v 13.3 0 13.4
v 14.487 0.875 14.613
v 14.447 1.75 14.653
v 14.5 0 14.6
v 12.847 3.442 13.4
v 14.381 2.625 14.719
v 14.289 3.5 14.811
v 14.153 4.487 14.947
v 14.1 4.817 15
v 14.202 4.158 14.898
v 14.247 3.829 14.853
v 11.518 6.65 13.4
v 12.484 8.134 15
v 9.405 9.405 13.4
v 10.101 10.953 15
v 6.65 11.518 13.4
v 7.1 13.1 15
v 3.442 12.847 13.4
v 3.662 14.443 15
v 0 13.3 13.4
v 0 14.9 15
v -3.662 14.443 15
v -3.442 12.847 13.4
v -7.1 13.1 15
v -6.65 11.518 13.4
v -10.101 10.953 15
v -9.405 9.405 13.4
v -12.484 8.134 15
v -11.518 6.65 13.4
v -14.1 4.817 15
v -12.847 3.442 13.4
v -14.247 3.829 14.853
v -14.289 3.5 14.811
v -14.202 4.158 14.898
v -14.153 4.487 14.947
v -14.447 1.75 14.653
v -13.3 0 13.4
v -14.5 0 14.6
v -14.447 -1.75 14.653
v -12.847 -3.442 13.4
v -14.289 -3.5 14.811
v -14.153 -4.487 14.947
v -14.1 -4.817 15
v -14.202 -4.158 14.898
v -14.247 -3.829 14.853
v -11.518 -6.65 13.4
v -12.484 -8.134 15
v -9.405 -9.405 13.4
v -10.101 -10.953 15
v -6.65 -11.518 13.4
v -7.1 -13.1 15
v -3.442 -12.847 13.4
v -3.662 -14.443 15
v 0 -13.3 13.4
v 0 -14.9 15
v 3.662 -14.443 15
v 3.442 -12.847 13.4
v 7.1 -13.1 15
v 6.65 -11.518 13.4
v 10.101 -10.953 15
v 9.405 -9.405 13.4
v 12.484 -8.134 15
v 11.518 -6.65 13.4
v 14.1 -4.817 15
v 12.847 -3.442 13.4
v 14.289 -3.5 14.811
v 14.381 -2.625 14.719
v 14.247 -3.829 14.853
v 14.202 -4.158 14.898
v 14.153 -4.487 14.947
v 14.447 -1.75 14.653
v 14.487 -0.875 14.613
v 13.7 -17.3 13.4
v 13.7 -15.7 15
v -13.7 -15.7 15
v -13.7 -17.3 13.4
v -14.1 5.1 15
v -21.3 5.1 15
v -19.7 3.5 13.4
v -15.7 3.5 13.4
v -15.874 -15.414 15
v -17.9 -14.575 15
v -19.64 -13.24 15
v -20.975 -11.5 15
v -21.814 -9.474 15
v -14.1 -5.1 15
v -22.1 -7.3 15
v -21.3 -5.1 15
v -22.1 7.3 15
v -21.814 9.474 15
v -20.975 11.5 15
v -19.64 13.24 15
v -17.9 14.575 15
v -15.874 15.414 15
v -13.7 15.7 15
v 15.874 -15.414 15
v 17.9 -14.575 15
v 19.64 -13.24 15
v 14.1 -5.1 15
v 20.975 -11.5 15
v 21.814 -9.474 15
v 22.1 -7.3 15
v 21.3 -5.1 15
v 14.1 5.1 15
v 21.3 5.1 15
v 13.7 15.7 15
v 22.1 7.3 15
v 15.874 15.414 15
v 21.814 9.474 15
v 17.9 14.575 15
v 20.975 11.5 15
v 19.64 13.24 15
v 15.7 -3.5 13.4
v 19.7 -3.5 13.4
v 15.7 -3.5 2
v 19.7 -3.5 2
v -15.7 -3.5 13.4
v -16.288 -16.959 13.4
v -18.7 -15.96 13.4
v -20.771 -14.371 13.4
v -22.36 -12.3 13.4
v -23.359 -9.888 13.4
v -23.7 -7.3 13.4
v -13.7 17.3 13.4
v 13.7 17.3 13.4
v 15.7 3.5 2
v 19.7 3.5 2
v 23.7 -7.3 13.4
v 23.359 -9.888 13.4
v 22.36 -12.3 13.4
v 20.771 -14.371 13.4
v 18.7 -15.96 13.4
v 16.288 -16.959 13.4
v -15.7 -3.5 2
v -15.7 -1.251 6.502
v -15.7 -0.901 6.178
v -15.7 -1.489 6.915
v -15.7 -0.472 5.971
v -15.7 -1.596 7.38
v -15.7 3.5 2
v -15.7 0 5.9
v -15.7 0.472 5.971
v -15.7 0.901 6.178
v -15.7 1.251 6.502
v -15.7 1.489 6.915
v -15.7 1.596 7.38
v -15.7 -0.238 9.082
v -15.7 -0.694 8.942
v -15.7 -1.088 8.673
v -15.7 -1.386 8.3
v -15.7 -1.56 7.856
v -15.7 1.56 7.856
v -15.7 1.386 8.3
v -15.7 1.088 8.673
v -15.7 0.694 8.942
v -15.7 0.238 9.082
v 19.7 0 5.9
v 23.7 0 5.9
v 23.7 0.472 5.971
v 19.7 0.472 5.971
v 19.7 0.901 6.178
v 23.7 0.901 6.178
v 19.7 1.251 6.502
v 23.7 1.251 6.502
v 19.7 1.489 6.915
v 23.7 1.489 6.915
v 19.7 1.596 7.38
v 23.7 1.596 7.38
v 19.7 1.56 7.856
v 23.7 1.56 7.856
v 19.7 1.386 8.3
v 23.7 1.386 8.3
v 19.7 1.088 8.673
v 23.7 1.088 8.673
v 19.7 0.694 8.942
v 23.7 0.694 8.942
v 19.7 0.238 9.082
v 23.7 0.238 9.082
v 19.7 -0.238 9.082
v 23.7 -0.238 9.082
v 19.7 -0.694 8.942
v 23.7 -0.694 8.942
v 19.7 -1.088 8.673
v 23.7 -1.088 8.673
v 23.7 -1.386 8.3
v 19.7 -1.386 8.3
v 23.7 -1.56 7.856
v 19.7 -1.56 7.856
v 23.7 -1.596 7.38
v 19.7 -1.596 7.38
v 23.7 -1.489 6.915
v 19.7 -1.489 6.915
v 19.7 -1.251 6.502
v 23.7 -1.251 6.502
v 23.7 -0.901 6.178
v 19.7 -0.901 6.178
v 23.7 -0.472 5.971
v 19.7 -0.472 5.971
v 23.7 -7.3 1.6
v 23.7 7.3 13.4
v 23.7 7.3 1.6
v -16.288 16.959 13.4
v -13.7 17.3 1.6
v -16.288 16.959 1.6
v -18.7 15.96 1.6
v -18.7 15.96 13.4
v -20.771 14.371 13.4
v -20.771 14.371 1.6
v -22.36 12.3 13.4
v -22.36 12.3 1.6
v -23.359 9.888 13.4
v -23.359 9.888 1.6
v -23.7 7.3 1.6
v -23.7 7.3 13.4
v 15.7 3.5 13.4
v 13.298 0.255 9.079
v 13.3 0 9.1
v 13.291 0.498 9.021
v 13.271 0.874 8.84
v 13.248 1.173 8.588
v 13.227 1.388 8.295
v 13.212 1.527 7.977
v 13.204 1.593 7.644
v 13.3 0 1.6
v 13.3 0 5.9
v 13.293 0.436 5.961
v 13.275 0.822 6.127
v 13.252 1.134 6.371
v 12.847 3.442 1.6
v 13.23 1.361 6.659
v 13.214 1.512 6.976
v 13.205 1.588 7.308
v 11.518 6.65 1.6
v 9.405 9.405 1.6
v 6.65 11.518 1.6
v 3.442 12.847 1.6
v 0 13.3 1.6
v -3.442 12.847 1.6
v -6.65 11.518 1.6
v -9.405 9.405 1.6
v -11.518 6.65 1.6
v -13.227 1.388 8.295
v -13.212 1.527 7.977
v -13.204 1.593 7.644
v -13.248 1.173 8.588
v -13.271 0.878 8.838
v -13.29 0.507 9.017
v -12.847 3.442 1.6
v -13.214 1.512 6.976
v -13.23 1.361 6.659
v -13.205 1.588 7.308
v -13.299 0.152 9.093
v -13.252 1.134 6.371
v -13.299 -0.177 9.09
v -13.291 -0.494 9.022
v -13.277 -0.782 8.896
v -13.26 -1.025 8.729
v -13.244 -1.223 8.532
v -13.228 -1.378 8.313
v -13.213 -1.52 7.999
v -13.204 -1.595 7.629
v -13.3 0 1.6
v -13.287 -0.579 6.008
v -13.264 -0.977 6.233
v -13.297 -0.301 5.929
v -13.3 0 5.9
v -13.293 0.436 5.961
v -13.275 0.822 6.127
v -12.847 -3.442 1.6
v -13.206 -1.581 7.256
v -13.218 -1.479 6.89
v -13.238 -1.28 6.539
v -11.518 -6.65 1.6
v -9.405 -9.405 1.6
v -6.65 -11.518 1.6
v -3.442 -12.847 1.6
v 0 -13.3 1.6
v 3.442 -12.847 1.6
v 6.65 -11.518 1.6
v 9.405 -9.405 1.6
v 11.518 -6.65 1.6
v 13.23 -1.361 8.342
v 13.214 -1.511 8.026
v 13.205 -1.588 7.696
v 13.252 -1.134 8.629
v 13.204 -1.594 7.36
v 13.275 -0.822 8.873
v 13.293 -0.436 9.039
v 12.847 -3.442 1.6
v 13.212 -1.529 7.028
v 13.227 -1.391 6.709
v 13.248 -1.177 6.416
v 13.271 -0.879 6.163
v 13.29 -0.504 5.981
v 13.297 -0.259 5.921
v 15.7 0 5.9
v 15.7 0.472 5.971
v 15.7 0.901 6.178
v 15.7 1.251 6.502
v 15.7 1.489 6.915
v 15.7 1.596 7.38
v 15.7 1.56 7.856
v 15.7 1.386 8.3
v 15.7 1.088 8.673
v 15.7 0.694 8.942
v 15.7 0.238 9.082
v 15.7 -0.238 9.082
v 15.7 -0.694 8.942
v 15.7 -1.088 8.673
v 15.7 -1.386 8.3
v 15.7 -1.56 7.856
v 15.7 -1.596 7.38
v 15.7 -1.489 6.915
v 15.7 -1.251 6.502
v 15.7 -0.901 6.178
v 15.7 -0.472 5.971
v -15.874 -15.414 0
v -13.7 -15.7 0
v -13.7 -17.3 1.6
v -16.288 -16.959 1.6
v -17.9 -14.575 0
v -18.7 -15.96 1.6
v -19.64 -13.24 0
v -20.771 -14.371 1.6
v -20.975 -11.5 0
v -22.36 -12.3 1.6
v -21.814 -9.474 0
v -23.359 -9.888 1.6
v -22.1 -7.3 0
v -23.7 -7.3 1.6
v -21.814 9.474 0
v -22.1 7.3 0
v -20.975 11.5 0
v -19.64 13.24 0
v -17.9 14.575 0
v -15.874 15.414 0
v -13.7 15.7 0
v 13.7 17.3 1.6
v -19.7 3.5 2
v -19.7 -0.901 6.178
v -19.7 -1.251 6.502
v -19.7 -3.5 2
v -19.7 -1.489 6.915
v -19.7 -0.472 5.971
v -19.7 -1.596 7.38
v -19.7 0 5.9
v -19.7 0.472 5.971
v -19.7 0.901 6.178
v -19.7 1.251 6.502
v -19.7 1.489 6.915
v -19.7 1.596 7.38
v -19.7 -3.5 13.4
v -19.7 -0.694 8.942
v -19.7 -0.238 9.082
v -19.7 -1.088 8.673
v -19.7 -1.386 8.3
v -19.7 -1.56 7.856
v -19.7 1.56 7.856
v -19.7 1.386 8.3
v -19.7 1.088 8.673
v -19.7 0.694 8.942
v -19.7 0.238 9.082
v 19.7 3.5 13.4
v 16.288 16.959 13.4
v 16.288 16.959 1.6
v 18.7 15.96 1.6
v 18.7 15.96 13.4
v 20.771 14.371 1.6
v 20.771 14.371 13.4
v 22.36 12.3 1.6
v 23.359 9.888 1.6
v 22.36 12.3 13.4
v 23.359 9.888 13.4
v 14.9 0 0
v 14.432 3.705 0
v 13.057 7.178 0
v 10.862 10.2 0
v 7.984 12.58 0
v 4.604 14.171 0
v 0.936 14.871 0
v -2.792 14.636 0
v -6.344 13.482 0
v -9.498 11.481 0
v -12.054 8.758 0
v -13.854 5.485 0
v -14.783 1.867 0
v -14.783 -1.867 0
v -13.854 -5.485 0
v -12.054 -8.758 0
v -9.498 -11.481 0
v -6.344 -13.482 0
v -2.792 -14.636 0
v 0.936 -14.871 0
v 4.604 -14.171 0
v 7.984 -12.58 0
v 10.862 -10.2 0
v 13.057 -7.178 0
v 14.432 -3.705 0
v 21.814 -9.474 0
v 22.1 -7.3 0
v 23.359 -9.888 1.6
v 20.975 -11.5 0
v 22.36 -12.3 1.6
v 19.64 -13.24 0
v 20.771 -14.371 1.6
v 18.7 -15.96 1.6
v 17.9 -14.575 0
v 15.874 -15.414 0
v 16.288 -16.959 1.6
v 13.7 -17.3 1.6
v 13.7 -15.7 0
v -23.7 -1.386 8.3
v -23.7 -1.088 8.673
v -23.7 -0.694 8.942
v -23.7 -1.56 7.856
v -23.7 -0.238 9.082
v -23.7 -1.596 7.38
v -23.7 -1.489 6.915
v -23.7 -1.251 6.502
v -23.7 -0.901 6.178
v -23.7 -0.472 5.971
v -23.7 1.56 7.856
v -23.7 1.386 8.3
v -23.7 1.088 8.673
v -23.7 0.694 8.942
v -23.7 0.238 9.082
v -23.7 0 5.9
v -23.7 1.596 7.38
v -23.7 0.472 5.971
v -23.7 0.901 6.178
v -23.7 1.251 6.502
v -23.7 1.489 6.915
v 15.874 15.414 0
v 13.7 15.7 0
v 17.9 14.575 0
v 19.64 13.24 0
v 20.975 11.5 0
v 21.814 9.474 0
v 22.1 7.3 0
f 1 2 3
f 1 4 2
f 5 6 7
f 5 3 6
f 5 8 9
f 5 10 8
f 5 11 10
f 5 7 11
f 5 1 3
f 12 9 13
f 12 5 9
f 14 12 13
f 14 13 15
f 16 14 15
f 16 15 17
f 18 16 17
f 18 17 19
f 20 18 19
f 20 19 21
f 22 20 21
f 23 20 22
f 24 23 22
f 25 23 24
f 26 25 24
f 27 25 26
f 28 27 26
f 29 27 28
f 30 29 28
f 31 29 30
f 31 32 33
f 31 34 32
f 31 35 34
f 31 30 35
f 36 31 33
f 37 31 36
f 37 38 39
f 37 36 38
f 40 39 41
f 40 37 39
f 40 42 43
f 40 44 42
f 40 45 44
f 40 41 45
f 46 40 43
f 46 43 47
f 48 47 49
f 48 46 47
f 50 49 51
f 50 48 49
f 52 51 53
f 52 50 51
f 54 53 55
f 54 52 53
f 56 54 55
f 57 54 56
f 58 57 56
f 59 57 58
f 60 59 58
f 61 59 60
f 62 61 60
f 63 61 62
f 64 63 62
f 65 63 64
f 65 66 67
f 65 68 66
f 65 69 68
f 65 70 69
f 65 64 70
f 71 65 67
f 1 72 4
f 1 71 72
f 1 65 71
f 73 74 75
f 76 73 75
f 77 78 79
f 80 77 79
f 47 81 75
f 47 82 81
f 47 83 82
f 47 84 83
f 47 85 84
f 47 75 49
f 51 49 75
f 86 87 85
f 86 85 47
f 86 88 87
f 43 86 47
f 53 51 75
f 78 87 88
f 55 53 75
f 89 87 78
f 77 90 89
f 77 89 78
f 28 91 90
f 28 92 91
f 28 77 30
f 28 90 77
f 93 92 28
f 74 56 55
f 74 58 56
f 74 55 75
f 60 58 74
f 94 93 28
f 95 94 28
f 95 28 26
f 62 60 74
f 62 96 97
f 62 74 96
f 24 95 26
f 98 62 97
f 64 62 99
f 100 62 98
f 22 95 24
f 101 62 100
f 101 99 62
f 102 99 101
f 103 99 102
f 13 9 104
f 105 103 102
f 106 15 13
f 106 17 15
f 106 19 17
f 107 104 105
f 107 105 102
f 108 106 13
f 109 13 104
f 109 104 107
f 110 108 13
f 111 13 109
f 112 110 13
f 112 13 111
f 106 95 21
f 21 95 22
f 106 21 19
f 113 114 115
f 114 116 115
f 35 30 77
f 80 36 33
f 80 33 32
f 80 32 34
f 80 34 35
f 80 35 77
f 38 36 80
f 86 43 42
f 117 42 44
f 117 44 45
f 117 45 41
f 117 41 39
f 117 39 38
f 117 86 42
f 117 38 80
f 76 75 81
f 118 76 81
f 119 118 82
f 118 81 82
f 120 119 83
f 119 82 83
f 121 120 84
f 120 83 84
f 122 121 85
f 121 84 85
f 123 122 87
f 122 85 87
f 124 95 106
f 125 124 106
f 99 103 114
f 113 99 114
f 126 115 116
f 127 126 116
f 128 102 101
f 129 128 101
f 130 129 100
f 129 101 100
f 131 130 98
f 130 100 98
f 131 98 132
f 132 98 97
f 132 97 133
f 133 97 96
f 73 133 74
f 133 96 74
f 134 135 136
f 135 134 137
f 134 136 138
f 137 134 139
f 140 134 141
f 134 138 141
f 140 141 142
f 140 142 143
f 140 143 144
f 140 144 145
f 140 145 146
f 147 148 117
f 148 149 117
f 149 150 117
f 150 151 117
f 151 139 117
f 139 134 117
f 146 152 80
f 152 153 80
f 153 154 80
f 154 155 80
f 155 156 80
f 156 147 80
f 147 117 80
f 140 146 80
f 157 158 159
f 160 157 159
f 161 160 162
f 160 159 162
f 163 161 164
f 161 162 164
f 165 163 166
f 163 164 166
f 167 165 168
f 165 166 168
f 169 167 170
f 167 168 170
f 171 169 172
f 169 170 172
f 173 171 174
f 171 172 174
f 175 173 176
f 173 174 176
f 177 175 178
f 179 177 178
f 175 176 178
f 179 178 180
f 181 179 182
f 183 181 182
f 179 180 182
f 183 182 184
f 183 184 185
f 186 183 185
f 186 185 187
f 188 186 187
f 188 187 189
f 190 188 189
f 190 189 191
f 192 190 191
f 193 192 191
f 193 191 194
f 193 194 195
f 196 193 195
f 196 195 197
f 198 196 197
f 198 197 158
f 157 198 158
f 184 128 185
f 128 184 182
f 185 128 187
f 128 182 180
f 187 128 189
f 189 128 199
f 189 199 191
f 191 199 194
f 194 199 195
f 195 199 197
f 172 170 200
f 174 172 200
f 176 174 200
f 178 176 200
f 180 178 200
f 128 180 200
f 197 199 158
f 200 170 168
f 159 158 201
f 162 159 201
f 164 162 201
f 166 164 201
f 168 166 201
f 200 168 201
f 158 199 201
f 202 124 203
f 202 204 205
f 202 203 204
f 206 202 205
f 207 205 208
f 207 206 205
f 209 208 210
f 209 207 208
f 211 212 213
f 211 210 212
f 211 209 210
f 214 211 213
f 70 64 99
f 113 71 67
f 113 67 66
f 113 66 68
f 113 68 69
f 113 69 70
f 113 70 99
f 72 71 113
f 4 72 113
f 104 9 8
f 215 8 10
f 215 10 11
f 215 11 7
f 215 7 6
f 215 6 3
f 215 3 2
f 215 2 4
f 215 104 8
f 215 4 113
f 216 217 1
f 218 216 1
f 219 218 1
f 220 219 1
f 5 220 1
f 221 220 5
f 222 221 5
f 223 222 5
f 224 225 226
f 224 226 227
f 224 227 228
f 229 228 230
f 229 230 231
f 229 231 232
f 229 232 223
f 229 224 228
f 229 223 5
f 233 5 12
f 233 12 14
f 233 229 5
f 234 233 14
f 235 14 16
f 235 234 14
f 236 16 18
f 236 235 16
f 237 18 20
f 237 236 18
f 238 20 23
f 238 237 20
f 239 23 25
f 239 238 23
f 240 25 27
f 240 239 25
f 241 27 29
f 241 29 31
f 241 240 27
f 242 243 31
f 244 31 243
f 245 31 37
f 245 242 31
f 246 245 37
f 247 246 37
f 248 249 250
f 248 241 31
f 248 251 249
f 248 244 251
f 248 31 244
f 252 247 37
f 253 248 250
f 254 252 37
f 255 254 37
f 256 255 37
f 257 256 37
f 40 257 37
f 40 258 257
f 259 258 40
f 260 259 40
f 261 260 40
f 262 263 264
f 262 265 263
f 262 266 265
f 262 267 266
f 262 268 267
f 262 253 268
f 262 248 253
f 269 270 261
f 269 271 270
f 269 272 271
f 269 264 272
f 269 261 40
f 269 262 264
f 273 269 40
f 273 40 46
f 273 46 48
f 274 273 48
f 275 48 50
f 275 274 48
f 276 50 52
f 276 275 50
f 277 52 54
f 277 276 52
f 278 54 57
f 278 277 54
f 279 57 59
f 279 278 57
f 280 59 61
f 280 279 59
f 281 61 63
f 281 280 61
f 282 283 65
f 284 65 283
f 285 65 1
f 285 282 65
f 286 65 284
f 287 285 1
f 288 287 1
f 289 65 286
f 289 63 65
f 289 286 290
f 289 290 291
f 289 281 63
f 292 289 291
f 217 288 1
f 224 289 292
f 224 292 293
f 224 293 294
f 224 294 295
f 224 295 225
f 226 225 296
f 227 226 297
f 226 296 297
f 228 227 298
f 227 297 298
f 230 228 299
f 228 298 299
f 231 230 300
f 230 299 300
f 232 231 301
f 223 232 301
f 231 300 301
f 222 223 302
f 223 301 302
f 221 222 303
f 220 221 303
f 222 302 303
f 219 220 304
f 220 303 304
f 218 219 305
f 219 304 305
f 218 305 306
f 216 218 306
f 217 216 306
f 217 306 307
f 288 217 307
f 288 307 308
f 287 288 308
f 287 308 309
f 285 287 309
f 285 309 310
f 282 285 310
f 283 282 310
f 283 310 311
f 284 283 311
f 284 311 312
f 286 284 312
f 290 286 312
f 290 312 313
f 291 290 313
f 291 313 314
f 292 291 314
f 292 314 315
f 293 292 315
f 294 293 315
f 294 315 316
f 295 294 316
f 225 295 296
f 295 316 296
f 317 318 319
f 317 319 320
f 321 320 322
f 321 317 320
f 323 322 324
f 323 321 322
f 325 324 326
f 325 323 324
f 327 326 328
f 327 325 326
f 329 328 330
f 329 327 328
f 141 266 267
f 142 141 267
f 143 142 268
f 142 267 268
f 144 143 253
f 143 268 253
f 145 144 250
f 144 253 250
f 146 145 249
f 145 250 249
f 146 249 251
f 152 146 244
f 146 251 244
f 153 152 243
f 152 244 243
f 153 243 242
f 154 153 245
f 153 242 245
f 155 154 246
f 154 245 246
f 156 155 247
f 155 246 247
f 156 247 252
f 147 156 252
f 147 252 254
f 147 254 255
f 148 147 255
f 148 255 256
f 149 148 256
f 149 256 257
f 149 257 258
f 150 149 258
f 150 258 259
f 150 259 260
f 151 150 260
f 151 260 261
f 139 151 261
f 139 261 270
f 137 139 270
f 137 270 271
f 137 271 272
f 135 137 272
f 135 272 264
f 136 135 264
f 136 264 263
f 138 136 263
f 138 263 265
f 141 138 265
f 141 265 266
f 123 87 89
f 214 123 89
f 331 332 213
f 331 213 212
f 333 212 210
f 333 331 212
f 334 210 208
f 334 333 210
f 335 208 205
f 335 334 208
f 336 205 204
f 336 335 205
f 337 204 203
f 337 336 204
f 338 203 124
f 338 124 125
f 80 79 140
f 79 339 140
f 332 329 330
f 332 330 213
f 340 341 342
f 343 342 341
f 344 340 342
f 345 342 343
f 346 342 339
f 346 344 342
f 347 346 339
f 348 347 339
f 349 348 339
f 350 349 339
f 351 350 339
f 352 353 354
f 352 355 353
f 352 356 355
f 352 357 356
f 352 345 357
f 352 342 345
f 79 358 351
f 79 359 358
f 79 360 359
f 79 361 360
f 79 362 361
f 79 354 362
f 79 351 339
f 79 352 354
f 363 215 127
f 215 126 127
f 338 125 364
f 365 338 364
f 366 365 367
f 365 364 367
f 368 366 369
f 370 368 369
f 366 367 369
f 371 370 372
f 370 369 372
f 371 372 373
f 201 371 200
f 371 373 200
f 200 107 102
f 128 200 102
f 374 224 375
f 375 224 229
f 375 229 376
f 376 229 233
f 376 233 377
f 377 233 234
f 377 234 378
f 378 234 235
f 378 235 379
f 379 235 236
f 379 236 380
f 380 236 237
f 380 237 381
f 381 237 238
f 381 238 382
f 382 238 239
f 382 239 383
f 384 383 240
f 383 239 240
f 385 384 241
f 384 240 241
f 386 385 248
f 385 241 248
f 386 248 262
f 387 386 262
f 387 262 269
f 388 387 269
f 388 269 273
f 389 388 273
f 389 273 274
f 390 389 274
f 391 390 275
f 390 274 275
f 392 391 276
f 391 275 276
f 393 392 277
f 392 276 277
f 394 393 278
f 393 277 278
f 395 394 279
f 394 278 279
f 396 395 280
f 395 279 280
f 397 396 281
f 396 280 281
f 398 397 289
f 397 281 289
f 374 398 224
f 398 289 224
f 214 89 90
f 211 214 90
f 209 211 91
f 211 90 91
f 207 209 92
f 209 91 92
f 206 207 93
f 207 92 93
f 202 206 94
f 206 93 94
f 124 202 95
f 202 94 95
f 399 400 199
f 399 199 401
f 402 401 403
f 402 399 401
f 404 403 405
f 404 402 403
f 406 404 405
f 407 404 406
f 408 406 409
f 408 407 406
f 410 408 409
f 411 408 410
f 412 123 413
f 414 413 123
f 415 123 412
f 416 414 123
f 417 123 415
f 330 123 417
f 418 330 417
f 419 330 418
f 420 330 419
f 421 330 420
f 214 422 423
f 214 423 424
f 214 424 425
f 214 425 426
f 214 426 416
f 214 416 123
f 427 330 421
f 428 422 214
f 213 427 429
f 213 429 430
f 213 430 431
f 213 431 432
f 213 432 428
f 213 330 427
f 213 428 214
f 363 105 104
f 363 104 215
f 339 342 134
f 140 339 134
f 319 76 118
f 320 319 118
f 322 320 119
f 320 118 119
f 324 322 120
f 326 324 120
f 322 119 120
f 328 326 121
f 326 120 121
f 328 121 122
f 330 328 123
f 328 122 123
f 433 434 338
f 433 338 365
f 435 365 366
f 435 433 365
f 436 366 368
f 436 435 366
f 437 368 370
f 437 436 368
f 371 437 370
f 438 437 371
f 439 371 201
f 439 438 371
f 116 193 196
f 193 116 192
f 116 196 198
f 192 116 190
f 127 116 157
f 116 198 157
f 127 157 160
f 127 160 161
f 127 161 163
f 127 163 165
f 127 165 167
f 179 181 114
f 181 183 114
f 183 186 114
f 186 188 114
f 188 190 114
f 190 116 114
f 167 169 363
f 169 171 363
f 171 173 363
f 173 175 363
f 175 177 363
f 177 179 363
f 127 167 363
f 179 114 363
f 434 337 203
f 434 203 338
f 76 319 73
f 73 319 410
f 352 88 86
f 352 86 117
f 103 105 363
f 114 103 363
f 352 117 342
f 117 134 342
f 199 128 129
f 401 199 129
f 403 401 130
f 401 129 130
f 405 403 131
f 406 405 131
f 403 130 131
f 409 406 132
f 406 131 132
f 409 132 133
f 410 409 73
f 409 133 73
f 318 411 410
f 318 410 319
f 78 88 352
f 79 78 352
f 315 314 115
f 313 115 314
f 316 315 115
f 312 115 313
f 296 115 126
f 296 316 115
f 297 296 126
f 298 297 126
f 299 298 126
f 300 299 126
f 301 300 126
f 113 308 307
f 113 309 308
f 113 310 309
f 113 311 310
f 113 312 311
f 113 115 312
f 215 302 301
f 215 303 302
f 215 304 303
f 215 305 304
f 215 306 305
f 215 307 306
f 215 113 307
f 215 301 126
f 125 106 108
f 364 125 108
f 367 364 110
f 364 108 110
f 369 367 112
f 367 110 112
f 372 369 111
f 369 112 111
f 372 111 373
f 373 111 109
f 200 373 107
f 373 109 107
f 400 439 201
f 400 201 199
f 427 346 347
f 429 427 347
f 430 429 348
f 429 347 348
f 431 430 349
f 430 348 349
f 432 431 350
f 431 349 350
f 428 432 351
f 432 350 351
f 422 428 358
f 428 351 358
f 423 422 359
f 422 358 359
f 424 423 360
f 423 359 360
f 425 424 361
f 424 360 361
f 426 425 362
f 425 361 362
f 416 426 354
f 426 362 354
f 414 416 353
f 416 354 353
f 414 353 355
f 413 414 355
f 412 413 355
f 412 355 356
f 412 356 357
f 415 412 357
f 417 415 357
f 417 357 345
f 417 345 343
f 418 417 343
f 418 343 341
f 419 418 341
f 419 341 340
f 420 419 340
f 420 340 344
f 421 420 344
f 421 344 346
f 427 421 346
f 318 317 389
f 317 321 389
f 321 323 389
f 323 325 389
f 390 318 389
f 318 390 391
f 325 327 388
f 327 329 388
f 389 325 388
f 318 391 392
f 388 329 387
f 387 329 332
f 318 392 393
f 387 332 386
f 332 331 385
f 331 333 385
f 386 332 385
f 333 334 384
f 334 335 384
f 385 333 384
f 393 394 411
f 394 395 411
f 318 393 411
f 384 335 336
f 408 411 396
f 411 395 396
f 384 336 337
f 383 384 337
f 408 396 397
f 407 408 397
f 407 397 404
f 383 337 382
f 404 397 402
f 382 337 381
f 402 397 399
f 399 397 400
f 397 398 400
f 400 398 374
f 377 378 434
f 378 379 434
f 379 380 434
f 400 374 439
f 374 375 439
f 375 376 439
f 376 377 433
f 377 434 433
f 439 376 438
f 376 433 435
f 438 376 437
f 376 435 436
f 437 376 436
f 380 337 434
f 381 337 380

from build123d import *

# Parameters (mm, degrees)
SKETCH1_W           = 47.4
SKETCH1_H           = 34.6
SKETCH1_R           = 13.3
BOSS_EXTRUDE1_DEPTH = 15
SKETCH2_R           = 1.6
CUT_EXTRUDE1_DEPTH  = 53.640763672
SKETCH3_W           = 4
SKETCH3_H           = 7
CUT_EXTRUDE2_DEPTH  = 13
CHAMFER1_SIZE       = 1.6
FILLET1_R           = 10
CHAMFER3_SIZE       = 1.6
CHAMFER4_SIZE       = 1.6


with BuildPart() as part:
    # Sketch1 → Boss-Extrude1 (new body)
    with BuildSketch(Plane.XY):
        Rectangle(SKETCH1_W, SKETCH1_H)
        Circle(SKETCH1_R, mode=Mode.SUBTRACT)
    extrude(amount=BOSS_EXTRUDE1_DEPTH)

    # Sketch2 → Cut-Extrude1 (cut, through all)
    with BuildSketch(Plane(origin=(23.7, 0, 0), x_dir=(0, 0, -1), z_dir=(1, 0, 0))):
        with Locations((-7.5, 0)):
            Circle(SKETCH2_R)
    extrude(amount=-CUT_EXTRUDE1_DEPTH, mode=Mode.SUBTRACT)

    # Sketch3 → Cut-Extrude2 (cut)
    with BuildSketch(Plane.XY.offset(15)):
        with Locations((17.7, 0)):
            Rectangle(SKETCH3_W, SKETCH3_H)
        with Locations((-17.7, 0)):
            Rectangle(SKETCH3_W, SKETCH3_H)
    extrude(amount=-CUT_EXTRUDE2_DEPTH, mode=Mode.SUBTRACT)

    # Chamfer1
    chamfer1_edges = [part.edges().sort_by_distance(p)[0] for p in [
        (-13.3, 0, 15),
    ]]
    chamfer(chamfer1_edges, length=CHAMFER1_SIZE)

    # Chamfer2
    # the kernel refuses this chamfer: 1.6 mm, written as the material it takes off along each edge
    with BuildSketch(Plane(origin=(19.7, -3.5, 15), x_dir=(0.9996219169112968, 0, 0.027495876610586226), z_dir=(0, 1, 0)), Plane(origin=(15.7, 3.5, 15), x_dir=(-0.9996219169112968, 0, 0.027495876610586285), z_dir=(0, -1, 0)), Plane(origin=(-15.7, -3.5, 15), x_dir=(0.9996219169112968, 0, 0.027495876610586285), z_dir=(0, 1, 0)), Plane(origin=(-19.7, 3.5, 15), x_dir=(-0.9996219169112968, 0, 0.027495876610586226), z_dir=(0, -1, 0))) as chamfer2_piece_1:
        with BuildLine():
            Line((1.645877112, 0), (-0.090475448, 1.64338847))
            Line((-0.090475448, 1.64338847), (-0.122463349, 1.642508602))
            ThreePointArc((-0.122463349, 1.642508602), (-0.054606763, 0.821436527), (-0.031987901, -0.000879868))
            Line((-0.031987901, -0.000879868), (0.000879868, -0.031987901))
            ThreePointArc((0.000879868, -0.031987901), (0.823196264, -0.009369039), (1.64675698, -0.031987901))
            Line((1.64675698, -0.031987901), (1.645877112, 0))
        make_face()
    extrude(amount=7, mode=Mode.SUBTRACT)
    with BuildSketch(Plane(origin=(19.7, 3.5, 15), x_dir=(0, 0.9996219169112968, 0.027495876610586285), z_dir=(-1, 0, 0)), Plane(origin=(15.7, -3.5, 15), x_dir=(0, -0.9996219169112968, 0.02749587661058628), z_dir=(1, 0, 0)), Plane(origin=(-15.7, 3.5, 15), x_dir=(2.330586862957201e-15, 0.9996219169112966, 0.027495876610586265), z_dir=(-1, 0, 0)), Plane(origin=(-19.7, -3.5, 15), x_dir=(2.3305868629572013e-15, -0.9996219169112968, 0.02749587661058628), z_dir=(1, 0, 0))) as chamfer2_piece_2:
        with BuildLine():
            Line((1.645877112, 0), (-0.090475448, 1.64338847))
            Line((-0.090475448, 1.64338847), (-0.122463349, 1.642508602))
            ThreePointArc((-0.122463349, 1.642508602), (-0.054606763, 0.821436527), (-0.031987901, -0.000879868))
            Line((-0.031987901, -0.000879868), (0.000879868, -0.031987901))
            ThreePointArc((0.000879868, -0.031987901), (0.823196264, -0.009369039), (1.64675698, -0.031987901))
            Line((1.64675698, -0.031987901), (1.645877112, 0))
        make_face()
    extrude(amount=4, mode=Mode.SUBTRACT)
    with BuildSketch(Plane(origin=(15.7, -3.5, 15), x_dir=(0, -0.9996219169112968, 0.02749587661058628), z_dir=(1, 0, 0))) as chamfer2_piece_3a_section:
        with BuildLine():
            Line((1.645877112, 0), (-0.090475448, 1.64338847))
            Line((-0.090475448, 1.64338847), (-0.122463349, 1.642508602))
            ThreePointArc((-0.122463349, 1.642508602), (-0.054606763, 0.821436527), (-0.031987901, -0.000879868))
            Line((-0.031987901, -0.000879868), (0.000879868, -0.031987901))
            ThreePointArc((0.000879868, -0.031987901), (0.823196264, -0.009369039), (1.64675698, -0.031987901))
            Line((1.64675698, -0.031987901), (1.645877112, 0))
        make_face()
    chamfer2_piece_3a = extrude(amount=8.114692781, mode=Mode.PRIVATE)
    chamfer2_piece_3a = split(chamfer2_piece_3a, bisect_by=Plane(origin=(19.7, -4.027669803, 14.472330197), z_dir=(1, 0, 0)), keep=Keep.TOP, mode=Mode.PRIVATE)
    with BuildSketch(Plane(origin=(19.7, -7.614692781, 15), x_dir=(0.9996219169112968, 0, 0.027495876610586226), z_dir=(0, 1, 0))) as chamfer2_piece_3b_section:
        with BuildLine():
            Line((1.645877112, 0), (-0.090475448, 1.64338847))
            Line((-0.090475448, 1.64338847), (-0.122463349, 1.642508602))
            ThreePointArc((-0.122463349, 1.642508602), (-0.054606763, 0.821436527), (-0.031987901, -0.000879868))
            Line((-0.031987901, -0.000879868), (0.000879868, -0.031987901))
            ThreePointArc((0.000879868, -0.031987901), (0.823196264, -0.009369039), (1.64675698, -0.031987901))
            Line((1.64675698, -0.031987901), (1.645877112, 0))
        make_face()
    chamfer2_piece_3b = extrude(amount=11.114692781, mode=Mode.PRIVATE)
    chamfer2_piece_3b = split(chamfer2_piece_3b, bisect_by=Plane(origin=(20.227669803, -3.5, 14.472330197), z_dir=(0, -1, 0)), keep=Keep.TOP, mode=Mode.PRIVATE)
    chamfer2_piece_3 = chamfer2_piece_3a & chamfer2_piece_3b
    add(chamfer2_piece_3, mode=Mode.SUBTRACT)
    with BuildSketch(Plane(origin=(19.7, -3.5, 15), x_dir=(0.9996219169112968, 0, 0.027495876610586226), z_dir=(0, 1, 0))) as chamfer2_piece_4a_section:
        with BuildLine():
            Line((1.645877112, 0), (-0.090475448, 1.64338847))
            Line((-0.090475448, 1.64338847), (-0.122463349, 1.642508602))
            ThreePointArc((-0.122463349, 1.642508602), (-0.054606763, 0.821436527), (-0.031987901, -0.000879868))
            Line((-0.031987901, -0.000879868), (0.000879868, -0.031987901))
            ThreePointArc((0.000879868, -0.031987901), (0.823196264, -0.009369039), (1.64675698, -0.031987901))
            Line((1.64675698, -0.031987901), (1.645877112, 0))
        make_face()
    chamfer2_piece_4a = extrude(amount=11.114692781, mode=Mode.PRIVATE)
    chamfer2_piece_4a = split(chamfer2_piece_4a, bisect_by=Plane(origin=(20.227669803, 3.5, 14.472330197), z_dir=(0, 1, 0)), keep=Keep.TOP, mode=Mode.PRIVATE)
    with BuildSketch(Plane(origin=(23.814692781, 3.5, 15), x_dir=(0, 0.9996219169112968, 0.02749587661058628), z_dir=(-1, 0, 0))) as chamfer2_piece_4b_section:
        with BuildLine():
            Line((1.645877112, 0), (-0.090475448, 1.64338847))
            Line((-0.090475448, 1.64338847), (-0.122463349, 1.642508602))
            ThreePointArc((-0.122463349, 1.642508602), (-0.054606763, 0.821436527), (-0.031987901, -0.000879868))
            Line((-0.031987901, -0.000879868), (0.000879868, -0.031987901))
            ThreePointArc((0.000879868, -0.031987901), (0.823196264, -0.009369039), (1.64675698, -0.031987901))
            Line((1.64675698, -0.031987901), (1.645877112, 0))
        make_face()
    chamfer2_piece_4b = extrude(amount=8.114692781, mode=Mode.PRIVATE)
    chamfer2_piece_4b = split(chamfer2_piece_4b, bisect_by=Plane(origin=(19.7, 4.027669803, 14.472330197), z_dir=(1, 0, 0)), keep=Keep.TOP, mode=Mode.PRIVATE)
    chamfer2_piece_4 = chamfer2_piece_4a & chamfer2_piece_4b
    add(chamfer2_piece_4, mode=Mode.SUBTRACT)
    with BuildSketch(Plane(origin=(19.7, 3.5, 15), x_dir=(0, 0.9996219169112968, 0.027495876610586285), z_dir=(-1, 0, 0))) as chamfer2_piece_5a_section:
        with BuildLine():
            Line((1.645877112, 0), (-0.090475448, 1.64338847))
            Line((-0.090475448, 1.64338847), (-0.122463349, 1.642508602))
            ThreePointArc((-0.122463349, 1.642508602), (-0.054606763, 0.821436527), (-0.031987901, -0.000879868))
            Line((-0.031987901, -0.000879868), (0.000879868, -0.031987901))
            ThreePointArc((0.000879868, -0.031987901), (0.823196264, -0.009369039), (1.64675698, -0.031987901))
            Line((1.64675698, -0.031987901), (1.645877112, 0))
        make_face()
    chamfer2_piece_5a = extrude(amount=8.114692781, mode=Mode.PRIVATE)
    chamfer2_piece_5a = split(chamfer2_piece_5a, bisect_by=Plane(origin=(15.7, 4.027669803, 14.472330197), z_dir=(-1, 0, 0)), keep=Keep.TOP, mode=Mode.PRIVATE)
    with BuildSketch(Plane(origin=(15.7, 7.614692781, 15), x_dir=(-0.9996219169112968, 0, 0.027495876610586285), z_dir=(0, -1, 0))) as chamfer2_piece_5b_section:
        with BuildLine():
            Line((1.645877112, 0), (-0.090475448, 1.64338847))
            Line((-0.090475448, 1.64338847), (-0.122463349, 1.642508602))
            ThreePointArc((-0.122463349, 1.642508602), (-0.054606763, 0.821436527), (-0.031987901, -0.000879868))
            Line((-0.031987901, -0.000879868), (0.000879868, -0.031987901))
            ThreePointArc((0.000879868, -0.031987901), (0.823196264, -0.009369039), (1.64675698, -0.031987901))
            Line((1.64675698, -0.031987901), (1.645877112, 0))
        make_face()
    chamfer2_piece_5b = extrude(amount=11.114692781, mode=Mode.PRIVATE)
    chamfer2_piece_5b = split(chamfer2_piece_5b, bisect_by=Plane(origin=(15.172330197, 3.5, 14.472330197), z_dir=(0, 1, 0)), keep=Keep.TOP, mode=Mode.PRIVATE)
    chamfer2_piece_5 = chamfer2_piece_5a & chamfer2_piece_5b
    add(chamfer2_piece_5, mode=Mode.SUBTRACT)
    with BuildSketch(Plane(origin=(11.585307219, -3.5, 15), x_dir=(0, -0.9996219169112966, 0.027495876610586265), z_dir=(1, 0, 0))) as chamfer2_piece_6a_section:
        with BuildLine():
            Line((1.645877112, 0), (-0.090475448, 1.64338847))
            Line((-0.090475448, 1.64338847), (-0.122463349, 1.642508602))
            ThreePointArc((-0.122463349, 1.642508602), (-0.054606763, 0.821436527), (-0.031987901, -0.000879868))
            Line((-0.031987901, -0.000879868), (0.000879868, -0.031987901))
            ThreePointArc((0.000879868, -0.031987901), (0.823196264, -0.009369039), (1.64675698, -0.031987901))
            Line((1.64675698, -0.031987901), (1.645877112, 0))
        make_face()
    chamfer2_piece_6a = extrude(amount=8.114692781, mode=Mode.PRIVATE)
    chamfer2_piece_6a = split(chamfer2_piece_6a, bisect_by=Plane(origin=(15.7, -4.027669803, 14.472330197), z_dir=(-1, 0, 0)), keep=Keep.TOP, mode=Mode.PRIVATE)
    with BuildSketch(Plane(origin=(15.7, 3.5, 15), x_dir=(-0.9996219169112968, 0, 0.027495876610586285), z_dir=(0, -1, 0))) as chamfer2_piece_6b_section:
        with BuildLine():
            Line((1.645877112, 0), (-0.090475448, 1.64338847))
            Line((-0.090475448, 1.64338847), (-0.122463349, 1.642508602))
            ThreePointArc((-0.122463349, 1.642508602), (-0.054606763, 0.821436527), (-0.031987901, -0.000879868))
            Line((-0.031987901, -0.000879868), (0.000879868, -0.031987901))
            ThreePointArc((0.000879868, -0.031987901), (0.823196264, -0.009369039), (1.64675698, -0.031987901))
            Line((1.64675698, -0.031987901), (1.645877112, 0))
        make_face()
    chamfer2_piece_6b = extrude(amount=11.114692781, mode=Mode.PRIVATE)
    chamfer2_piece_6b = split(chamfer2_piece_6b, bisect_by=Plane(origin=(15.172330197, -3.5, 14.472330197), z_dir=(0, -1, 0)), keep=Keep.TOP, mode=Mode.PRIVATE)
    chamfer2_piece_6 = chamfer2_piece_6a & chamfer2_piece_6b
    add(chamfer2_piece_6, mode=Mode.SUBTRACT)
    with BuildSketch(Plane(origin=(-19.7, -3.5, 15), x_dir=(2.3305868629572013e-15, -0.9996219169112968, 0.02749587661058628), z_dir=(1, 0, 0))) as chamfer2_piece_7a_section:
        with BuildLine():
            Line((1.645877112, 0), (-0.090475448, 1.64338847))
            Line((-0.090475448, 1.64338847), (-0.122463349, 1.642508602))
            ThreePointArc((-0.122463349, 1.642508602), (-0.054606763, 0.821436527), (-0.031987901, -0.000879868))
            Line((-0.031987901, -0.000879868), (0.000879868, -0.031987901))
            ThreePointArc((0.000879868, -0.031987901), (0.823196264, -0.009369039), (1.64675698, -0.031987901))
            Line((1.64675698, -0.031987901), (1.645877112, 0))
        make_face()
    chamfer2_piece_7a = extrude(amount=8.114692781, mode=Mode.PRIVATE)
    chamfer2_piece_7a = split(chamfer2_piece_7a, bisect_by=Plane(origin=(-15.7, -4.027669803, 14.472330197), z_dir=(1, 0, 0)), keep=Keep.TOP, mode=Mode.PRIVATE)
    with BuildSketch(Plane(origin=(-15.7, -7.614692781, 15), x_dir=(0.9996219169112968, 0, 0.027495876610586285), z_dir=(0, 1, 0))) as chamfer2_piece_7b_section:
        with BuildLine():
            Line((1.645877112, 0), (-0.090475448, 1.64338847))
            Line((-0.090475448, 1.64338847), (-0.122463349, 1.642508602))
            ThreePointArc((-0.122463349, 1.642508602), (-0.054606763, 0.821436527), (-0.031987901, -0.000879868))
            Line((-0.031987901, -0.000879868), (0.000879868, -0.031987901))
            ThreePointArc((0.000879868, -0.031987901), (0.823196264, -0.009369039), (1.64675698, -0.031987901))
            Line((1.64675698, -0.031987901), (1.645877112, 0))
        make_face()
    chamfer2_piece_7b = extrude(amount=11.114692781, mode=Mode.PRIVATE)
    chamfer2_piece_7b = split(chamfer2_piece_7b, bisect_by=Plane(origin=(-15.172330197, -3.5, 14.472330197), z_dir=(0, -1, 0)), keep=Keep.TOP, mode=Mode.PRIVATE)
    chamfer2_piece_7 = chamfer2_piece_7a & chamfer2_piece_7b
    add(chamfer2_piece_7, mode=Mode.SUBTRACT)
    with BuildSketch(Plane(origin=(-11.585307219, 3.5, 15), x_dir=(2.3305868629572017e-15, 0.9996219169112968, 0.027495876610586285), z_dir=(-1, 0, 0))) as chamfer2_piece_8a_section:
        with BuildLine():
            Line((1.645877112, 0), (-0.090475448, 1.64338847))
            Line((-0.090475448, 1.64338847), (-0.122463349, 1.642508602))
            ThreePointArc((-0.122463349, 1.642508602), (-0.054606763, 0.821436527), (-0.031987901, -0.000879868))
            Line((-0.031987901, -0.000879868), (0.000879868, -0.031987901))
            ThreePointArc((0.000879868, -0.031987901), (0.823196264, -0.009369039), (1.64675698, -0.031987901))
            Line((1.64675698, -0.031987901), (1.645877112, 0))
        make_face()
    chamfer2_piece_8a = extrude(amount=8.114692781, mode=Mode.PRIVATE)
    chamfer2_piece_8a = split(chamfer2_piece_8a, bisect_by=Plane(origin=(-15.7, 4.027669803, 14.472330197), z_dir=(1, 0, 0)), keep=Keep.TOP, mode=Mode.PRIVATE)
    with BuildSketch(Plane(origin=(-15.7, -3.5, 15), x_dir=(0.9996219169112968, 0, 0.027495876610586285), z_dir=(0, 1, 0))) as chamfer2_piece_8b_section:
        with BuildLine():
            Line((1.645877112, 0), (-0.090475448, 1.64338847))
            Line((-0.090475448, 1.64338847), (-0.122463349, 1.642508602))
            ThreePointArc((-0.122463349, 1.642508602), (-0.054606763, 0.821436527), (-0.031987901, -0.000879868))
            Line((-0.031987901, -0.000879868), (0.000879868, -0.031987901))
            ThreePointArc((0.000879868, -0.031987901), (0.823196264, -0.009369039), (1.64675698, -0.031987901))
            Line((1.64675698, -0.031987901), (1.645877112, 0))
        make_face()
    chamfer2_piece_8b = extrude(amount=11.114692781, mode=Mode.PRIVATE)
    chamfer2_piece_8b = split(chamfer2_piece_8b, bisect_by=Plane(origin=(-15.172330197, 3.5, 14.472330197), z_dir=(0, 1, 0)), keep=Keep.TOP, mode=Mode.PRIVATE)
    chamfer2_piece_8 = chamfer2_piece_8a & chamfer2_piece_8b
    add(chamfer2_piece_8, mode=Mode.SUBTRACT)
    with BuildSketch(Plane(origin=(-15.7, 3.5, 15), x_dir=(2.330586862957201e-15, 0.9996219169112966, 0.027495876610586265), z_dir=(-1, 0, 0))) as chamfer2_piece_9a_section:
        with BuildLine():
            Line((1.645877112, 0), (-0.090475448, 1.64338847))
            Line((-0.090475448, 1.64338847), (-0.122463349, 1.642508602))
            ThreePointArc((-0.122463349, 1.642508602), (-0.054606763, 0.821436527), (-0.031987901, -0.000879868))
            Line((-0.031987901, -0.000879868), (0.000879868, -0.031987901))
            ThreePointArc((0.000879868, -0.031987901), (0.823196264, -0.009369039), (1.64675698, -0.031987901))
            Line((1.64675698, -0.031987901), (1.645877112, 0))
        make_face()
    chamfer2_piece_9a = extrude(amount=8.114692781, mode=Mode.PRIVATE)
    chamfer2_piece_9a = split(chamfer2_piece_9a, bisect_by=Plane(origin=(-19.7, 4.027669803, 14.472330197), z_dir=(-1, 0, 0)), keep=Keep.TOP, mode=Mode.PRIVATE)
    with BuildSketch(Plane(origin=(-19.7, 7.614692781, 15), x_dir=(-0.9996219169112968, 0, 0.027495876610586226), z_dir=(0, -1, 0))) as chamfer2_piece_9b_section:
        with BuildLine():
            Line((1.645877112, 0), (-0.090475448, 1.64338847))
            Line((-0.090475448, 1.64338847), (-0.122463349, 1.642508602))
            ThreePointArc((-0.122463349, 1.642508602), (-0.054606763, 0.821436527), (-0.031987901, -0.000879868))
            Line((-0.031987901, -0.000879868), (0.000879868, -0.031987901))
            ThreePointArc((0.000879868, -0.031987901), (0.823196264, -0.009369039), (1.64675698, -0.031987901))
            Line((1.64675698, -0.031987901), (1.645877112, 0))
        make_face()
    chamfer2_piece_9b = extrude(amount=11.114692781, mode=Mode.PRIVATE)
    chamfer2_piece_9b = split(chamfer2_piece_9b, bisect_by=Plane(origin=(-20.227669803, 3.5, 14.472330197), z_dir=(0, 1, 0)), keep=Keep.TOP, mode=Mode.PRIVATE)
    chamfer2_piece_9 = chamfer2_piece_9a & chamfer2_piece_9b
    add(chamfer2_piece_9, mode=Mode.SUBTRACT)
    with BuildSketch(Plane(origin=(-19.7, 3.5, 15), x_dir=(-0.9996219169112968, 0, 0.027495876610586226), z_dir=(0, -1, 0))) as chamfer2_piece_10a_section:
        with BuildLine():
            Line((1.645877112, 0), (-0.090475448, 1.64338847))
            Line((-0.090475448, 1.64338847), (-0.122463349, 1.642508602))
            ThreePointArc((-0.122463349, 1.642508602), (-0.054606763, 0.821436527), (-0.031987901, -0.000879868))
            Line((-0.031987901, -0.000879868), (0.000879868, -0.031987901))
            ThreePointArc((0.000879868, -0.031987901), (0.823196264, -0.009369039), (1.64675698, -0.031987901))
            Line((1.64675698, -0.031987901), (1.645877112, 0))
        make_face()
    chamfer2_piece_10a = extrude(amount=11.114692781, mode=Mode.PRIVATE)
    chamfer2_piece_10a = split(chamfer2_piece_10a, bisect_by=Plane(origin=(-20.227669803, -3.5, 14.472330197), z_dir=(0, -1, 0)), keep=Keep.TOP, mode=Mode.PRIVATE)
    with BuildSketch(Plane(origin=(-23.814692781, -3.5, 15), x_dir=(2.3305868629572013e-15, -0.9996219169112968, 0.02749587661058628), z_dir=(1, 0, 0))) as chamfer2_piece_10b_section:
        with BuildLine():
            Line((1.645877112, 0), (-0.090475448, 1.64338847))
            Line((-0.090475448, 1.64338847), (-0.122463349, 1.642508602))
            ThreePointArc((-0.122463349, 1.642508602), (-0.054606763, 0.821436527), (-0.031987901, -0.000879868))
            Line((-0.031987901, -0.000879868), (0.000879868, -0.031987901))
            ThreePointArc((0.000879868, -0.031987901), (0.823196264, -0.009369039), (1.64675698, -0.031987901))
            Line((1.64675698, -0.031987901), (1.645877112, 0))
        make_face()
    chamfer2_piece_10b = extrude(amount=8.114692781, mode=Mode.PRIVATE)
    chamfer2_piece_10b = split(chamfer2_piece_10b, bisect_by=Plane(origin=(-19.7, -4.027669803, 14.472330197), z_dir=(-1, 0, 0)), keep=Keep.TOP, mode=Mode.PRIVATE)
    chamfer2_piece_10 = chamfer2_piece_10a & chamfer2_piece_10b
    add(chamfer2_piece_10, mode=Mode.SUBTRACT)

    # Fillet1
    fillet1_edges = [part.edges().sort_by_distance(p)[0] for p in [
        (23.7, -17.3, 7.5),
        (-23.7, -17.3, 7.5),
        (-23.7, 17.3, 7.5),
        (23.7, 17.3, 7.5),
    ]]
    fillet(fillet1_edges, radius=FILLET1_R)

    # Chamfer3
    chamfer3_edges = [part.edges().sort_by_distance(p)[0] for p in [
        (-13.3, 0, 0),
        (0, 17.3, 0),
        (23.7, 0, 0),
        (0, -17.3, 0),
        (-23.7, 0, 0),
        (-20.771067812, 14.371067812, 0),
        (-20.771067812, -14.371067812, 0),
        (20.771067812, -14.371067812, 0),
        (20.771067812, 14.371067812, 0),
    ]]
    chamfer(chamfer3_edges, length=CHAMFER3_SIZE)

    # Chamfer4
    chamfer4_edges = [part.edges().sort_by_distance(p)[0] for p in [
        (-23.7, 0, 15),
        (0, -17.3, 15),
        (-20.771067812, 14.371067812, 15),
        (-20.771067812, -14.371067812, 15),
        (20.771067812, -14.371067812, 15),
        (20.771067812, 14.371067812, 15),
        (0, 17.3, 15),
        (23.7, 0, 15),
    ]]
    chamfer(chamfer4_edges, length=CHAMFER4_SIZE)


solid = part.part
